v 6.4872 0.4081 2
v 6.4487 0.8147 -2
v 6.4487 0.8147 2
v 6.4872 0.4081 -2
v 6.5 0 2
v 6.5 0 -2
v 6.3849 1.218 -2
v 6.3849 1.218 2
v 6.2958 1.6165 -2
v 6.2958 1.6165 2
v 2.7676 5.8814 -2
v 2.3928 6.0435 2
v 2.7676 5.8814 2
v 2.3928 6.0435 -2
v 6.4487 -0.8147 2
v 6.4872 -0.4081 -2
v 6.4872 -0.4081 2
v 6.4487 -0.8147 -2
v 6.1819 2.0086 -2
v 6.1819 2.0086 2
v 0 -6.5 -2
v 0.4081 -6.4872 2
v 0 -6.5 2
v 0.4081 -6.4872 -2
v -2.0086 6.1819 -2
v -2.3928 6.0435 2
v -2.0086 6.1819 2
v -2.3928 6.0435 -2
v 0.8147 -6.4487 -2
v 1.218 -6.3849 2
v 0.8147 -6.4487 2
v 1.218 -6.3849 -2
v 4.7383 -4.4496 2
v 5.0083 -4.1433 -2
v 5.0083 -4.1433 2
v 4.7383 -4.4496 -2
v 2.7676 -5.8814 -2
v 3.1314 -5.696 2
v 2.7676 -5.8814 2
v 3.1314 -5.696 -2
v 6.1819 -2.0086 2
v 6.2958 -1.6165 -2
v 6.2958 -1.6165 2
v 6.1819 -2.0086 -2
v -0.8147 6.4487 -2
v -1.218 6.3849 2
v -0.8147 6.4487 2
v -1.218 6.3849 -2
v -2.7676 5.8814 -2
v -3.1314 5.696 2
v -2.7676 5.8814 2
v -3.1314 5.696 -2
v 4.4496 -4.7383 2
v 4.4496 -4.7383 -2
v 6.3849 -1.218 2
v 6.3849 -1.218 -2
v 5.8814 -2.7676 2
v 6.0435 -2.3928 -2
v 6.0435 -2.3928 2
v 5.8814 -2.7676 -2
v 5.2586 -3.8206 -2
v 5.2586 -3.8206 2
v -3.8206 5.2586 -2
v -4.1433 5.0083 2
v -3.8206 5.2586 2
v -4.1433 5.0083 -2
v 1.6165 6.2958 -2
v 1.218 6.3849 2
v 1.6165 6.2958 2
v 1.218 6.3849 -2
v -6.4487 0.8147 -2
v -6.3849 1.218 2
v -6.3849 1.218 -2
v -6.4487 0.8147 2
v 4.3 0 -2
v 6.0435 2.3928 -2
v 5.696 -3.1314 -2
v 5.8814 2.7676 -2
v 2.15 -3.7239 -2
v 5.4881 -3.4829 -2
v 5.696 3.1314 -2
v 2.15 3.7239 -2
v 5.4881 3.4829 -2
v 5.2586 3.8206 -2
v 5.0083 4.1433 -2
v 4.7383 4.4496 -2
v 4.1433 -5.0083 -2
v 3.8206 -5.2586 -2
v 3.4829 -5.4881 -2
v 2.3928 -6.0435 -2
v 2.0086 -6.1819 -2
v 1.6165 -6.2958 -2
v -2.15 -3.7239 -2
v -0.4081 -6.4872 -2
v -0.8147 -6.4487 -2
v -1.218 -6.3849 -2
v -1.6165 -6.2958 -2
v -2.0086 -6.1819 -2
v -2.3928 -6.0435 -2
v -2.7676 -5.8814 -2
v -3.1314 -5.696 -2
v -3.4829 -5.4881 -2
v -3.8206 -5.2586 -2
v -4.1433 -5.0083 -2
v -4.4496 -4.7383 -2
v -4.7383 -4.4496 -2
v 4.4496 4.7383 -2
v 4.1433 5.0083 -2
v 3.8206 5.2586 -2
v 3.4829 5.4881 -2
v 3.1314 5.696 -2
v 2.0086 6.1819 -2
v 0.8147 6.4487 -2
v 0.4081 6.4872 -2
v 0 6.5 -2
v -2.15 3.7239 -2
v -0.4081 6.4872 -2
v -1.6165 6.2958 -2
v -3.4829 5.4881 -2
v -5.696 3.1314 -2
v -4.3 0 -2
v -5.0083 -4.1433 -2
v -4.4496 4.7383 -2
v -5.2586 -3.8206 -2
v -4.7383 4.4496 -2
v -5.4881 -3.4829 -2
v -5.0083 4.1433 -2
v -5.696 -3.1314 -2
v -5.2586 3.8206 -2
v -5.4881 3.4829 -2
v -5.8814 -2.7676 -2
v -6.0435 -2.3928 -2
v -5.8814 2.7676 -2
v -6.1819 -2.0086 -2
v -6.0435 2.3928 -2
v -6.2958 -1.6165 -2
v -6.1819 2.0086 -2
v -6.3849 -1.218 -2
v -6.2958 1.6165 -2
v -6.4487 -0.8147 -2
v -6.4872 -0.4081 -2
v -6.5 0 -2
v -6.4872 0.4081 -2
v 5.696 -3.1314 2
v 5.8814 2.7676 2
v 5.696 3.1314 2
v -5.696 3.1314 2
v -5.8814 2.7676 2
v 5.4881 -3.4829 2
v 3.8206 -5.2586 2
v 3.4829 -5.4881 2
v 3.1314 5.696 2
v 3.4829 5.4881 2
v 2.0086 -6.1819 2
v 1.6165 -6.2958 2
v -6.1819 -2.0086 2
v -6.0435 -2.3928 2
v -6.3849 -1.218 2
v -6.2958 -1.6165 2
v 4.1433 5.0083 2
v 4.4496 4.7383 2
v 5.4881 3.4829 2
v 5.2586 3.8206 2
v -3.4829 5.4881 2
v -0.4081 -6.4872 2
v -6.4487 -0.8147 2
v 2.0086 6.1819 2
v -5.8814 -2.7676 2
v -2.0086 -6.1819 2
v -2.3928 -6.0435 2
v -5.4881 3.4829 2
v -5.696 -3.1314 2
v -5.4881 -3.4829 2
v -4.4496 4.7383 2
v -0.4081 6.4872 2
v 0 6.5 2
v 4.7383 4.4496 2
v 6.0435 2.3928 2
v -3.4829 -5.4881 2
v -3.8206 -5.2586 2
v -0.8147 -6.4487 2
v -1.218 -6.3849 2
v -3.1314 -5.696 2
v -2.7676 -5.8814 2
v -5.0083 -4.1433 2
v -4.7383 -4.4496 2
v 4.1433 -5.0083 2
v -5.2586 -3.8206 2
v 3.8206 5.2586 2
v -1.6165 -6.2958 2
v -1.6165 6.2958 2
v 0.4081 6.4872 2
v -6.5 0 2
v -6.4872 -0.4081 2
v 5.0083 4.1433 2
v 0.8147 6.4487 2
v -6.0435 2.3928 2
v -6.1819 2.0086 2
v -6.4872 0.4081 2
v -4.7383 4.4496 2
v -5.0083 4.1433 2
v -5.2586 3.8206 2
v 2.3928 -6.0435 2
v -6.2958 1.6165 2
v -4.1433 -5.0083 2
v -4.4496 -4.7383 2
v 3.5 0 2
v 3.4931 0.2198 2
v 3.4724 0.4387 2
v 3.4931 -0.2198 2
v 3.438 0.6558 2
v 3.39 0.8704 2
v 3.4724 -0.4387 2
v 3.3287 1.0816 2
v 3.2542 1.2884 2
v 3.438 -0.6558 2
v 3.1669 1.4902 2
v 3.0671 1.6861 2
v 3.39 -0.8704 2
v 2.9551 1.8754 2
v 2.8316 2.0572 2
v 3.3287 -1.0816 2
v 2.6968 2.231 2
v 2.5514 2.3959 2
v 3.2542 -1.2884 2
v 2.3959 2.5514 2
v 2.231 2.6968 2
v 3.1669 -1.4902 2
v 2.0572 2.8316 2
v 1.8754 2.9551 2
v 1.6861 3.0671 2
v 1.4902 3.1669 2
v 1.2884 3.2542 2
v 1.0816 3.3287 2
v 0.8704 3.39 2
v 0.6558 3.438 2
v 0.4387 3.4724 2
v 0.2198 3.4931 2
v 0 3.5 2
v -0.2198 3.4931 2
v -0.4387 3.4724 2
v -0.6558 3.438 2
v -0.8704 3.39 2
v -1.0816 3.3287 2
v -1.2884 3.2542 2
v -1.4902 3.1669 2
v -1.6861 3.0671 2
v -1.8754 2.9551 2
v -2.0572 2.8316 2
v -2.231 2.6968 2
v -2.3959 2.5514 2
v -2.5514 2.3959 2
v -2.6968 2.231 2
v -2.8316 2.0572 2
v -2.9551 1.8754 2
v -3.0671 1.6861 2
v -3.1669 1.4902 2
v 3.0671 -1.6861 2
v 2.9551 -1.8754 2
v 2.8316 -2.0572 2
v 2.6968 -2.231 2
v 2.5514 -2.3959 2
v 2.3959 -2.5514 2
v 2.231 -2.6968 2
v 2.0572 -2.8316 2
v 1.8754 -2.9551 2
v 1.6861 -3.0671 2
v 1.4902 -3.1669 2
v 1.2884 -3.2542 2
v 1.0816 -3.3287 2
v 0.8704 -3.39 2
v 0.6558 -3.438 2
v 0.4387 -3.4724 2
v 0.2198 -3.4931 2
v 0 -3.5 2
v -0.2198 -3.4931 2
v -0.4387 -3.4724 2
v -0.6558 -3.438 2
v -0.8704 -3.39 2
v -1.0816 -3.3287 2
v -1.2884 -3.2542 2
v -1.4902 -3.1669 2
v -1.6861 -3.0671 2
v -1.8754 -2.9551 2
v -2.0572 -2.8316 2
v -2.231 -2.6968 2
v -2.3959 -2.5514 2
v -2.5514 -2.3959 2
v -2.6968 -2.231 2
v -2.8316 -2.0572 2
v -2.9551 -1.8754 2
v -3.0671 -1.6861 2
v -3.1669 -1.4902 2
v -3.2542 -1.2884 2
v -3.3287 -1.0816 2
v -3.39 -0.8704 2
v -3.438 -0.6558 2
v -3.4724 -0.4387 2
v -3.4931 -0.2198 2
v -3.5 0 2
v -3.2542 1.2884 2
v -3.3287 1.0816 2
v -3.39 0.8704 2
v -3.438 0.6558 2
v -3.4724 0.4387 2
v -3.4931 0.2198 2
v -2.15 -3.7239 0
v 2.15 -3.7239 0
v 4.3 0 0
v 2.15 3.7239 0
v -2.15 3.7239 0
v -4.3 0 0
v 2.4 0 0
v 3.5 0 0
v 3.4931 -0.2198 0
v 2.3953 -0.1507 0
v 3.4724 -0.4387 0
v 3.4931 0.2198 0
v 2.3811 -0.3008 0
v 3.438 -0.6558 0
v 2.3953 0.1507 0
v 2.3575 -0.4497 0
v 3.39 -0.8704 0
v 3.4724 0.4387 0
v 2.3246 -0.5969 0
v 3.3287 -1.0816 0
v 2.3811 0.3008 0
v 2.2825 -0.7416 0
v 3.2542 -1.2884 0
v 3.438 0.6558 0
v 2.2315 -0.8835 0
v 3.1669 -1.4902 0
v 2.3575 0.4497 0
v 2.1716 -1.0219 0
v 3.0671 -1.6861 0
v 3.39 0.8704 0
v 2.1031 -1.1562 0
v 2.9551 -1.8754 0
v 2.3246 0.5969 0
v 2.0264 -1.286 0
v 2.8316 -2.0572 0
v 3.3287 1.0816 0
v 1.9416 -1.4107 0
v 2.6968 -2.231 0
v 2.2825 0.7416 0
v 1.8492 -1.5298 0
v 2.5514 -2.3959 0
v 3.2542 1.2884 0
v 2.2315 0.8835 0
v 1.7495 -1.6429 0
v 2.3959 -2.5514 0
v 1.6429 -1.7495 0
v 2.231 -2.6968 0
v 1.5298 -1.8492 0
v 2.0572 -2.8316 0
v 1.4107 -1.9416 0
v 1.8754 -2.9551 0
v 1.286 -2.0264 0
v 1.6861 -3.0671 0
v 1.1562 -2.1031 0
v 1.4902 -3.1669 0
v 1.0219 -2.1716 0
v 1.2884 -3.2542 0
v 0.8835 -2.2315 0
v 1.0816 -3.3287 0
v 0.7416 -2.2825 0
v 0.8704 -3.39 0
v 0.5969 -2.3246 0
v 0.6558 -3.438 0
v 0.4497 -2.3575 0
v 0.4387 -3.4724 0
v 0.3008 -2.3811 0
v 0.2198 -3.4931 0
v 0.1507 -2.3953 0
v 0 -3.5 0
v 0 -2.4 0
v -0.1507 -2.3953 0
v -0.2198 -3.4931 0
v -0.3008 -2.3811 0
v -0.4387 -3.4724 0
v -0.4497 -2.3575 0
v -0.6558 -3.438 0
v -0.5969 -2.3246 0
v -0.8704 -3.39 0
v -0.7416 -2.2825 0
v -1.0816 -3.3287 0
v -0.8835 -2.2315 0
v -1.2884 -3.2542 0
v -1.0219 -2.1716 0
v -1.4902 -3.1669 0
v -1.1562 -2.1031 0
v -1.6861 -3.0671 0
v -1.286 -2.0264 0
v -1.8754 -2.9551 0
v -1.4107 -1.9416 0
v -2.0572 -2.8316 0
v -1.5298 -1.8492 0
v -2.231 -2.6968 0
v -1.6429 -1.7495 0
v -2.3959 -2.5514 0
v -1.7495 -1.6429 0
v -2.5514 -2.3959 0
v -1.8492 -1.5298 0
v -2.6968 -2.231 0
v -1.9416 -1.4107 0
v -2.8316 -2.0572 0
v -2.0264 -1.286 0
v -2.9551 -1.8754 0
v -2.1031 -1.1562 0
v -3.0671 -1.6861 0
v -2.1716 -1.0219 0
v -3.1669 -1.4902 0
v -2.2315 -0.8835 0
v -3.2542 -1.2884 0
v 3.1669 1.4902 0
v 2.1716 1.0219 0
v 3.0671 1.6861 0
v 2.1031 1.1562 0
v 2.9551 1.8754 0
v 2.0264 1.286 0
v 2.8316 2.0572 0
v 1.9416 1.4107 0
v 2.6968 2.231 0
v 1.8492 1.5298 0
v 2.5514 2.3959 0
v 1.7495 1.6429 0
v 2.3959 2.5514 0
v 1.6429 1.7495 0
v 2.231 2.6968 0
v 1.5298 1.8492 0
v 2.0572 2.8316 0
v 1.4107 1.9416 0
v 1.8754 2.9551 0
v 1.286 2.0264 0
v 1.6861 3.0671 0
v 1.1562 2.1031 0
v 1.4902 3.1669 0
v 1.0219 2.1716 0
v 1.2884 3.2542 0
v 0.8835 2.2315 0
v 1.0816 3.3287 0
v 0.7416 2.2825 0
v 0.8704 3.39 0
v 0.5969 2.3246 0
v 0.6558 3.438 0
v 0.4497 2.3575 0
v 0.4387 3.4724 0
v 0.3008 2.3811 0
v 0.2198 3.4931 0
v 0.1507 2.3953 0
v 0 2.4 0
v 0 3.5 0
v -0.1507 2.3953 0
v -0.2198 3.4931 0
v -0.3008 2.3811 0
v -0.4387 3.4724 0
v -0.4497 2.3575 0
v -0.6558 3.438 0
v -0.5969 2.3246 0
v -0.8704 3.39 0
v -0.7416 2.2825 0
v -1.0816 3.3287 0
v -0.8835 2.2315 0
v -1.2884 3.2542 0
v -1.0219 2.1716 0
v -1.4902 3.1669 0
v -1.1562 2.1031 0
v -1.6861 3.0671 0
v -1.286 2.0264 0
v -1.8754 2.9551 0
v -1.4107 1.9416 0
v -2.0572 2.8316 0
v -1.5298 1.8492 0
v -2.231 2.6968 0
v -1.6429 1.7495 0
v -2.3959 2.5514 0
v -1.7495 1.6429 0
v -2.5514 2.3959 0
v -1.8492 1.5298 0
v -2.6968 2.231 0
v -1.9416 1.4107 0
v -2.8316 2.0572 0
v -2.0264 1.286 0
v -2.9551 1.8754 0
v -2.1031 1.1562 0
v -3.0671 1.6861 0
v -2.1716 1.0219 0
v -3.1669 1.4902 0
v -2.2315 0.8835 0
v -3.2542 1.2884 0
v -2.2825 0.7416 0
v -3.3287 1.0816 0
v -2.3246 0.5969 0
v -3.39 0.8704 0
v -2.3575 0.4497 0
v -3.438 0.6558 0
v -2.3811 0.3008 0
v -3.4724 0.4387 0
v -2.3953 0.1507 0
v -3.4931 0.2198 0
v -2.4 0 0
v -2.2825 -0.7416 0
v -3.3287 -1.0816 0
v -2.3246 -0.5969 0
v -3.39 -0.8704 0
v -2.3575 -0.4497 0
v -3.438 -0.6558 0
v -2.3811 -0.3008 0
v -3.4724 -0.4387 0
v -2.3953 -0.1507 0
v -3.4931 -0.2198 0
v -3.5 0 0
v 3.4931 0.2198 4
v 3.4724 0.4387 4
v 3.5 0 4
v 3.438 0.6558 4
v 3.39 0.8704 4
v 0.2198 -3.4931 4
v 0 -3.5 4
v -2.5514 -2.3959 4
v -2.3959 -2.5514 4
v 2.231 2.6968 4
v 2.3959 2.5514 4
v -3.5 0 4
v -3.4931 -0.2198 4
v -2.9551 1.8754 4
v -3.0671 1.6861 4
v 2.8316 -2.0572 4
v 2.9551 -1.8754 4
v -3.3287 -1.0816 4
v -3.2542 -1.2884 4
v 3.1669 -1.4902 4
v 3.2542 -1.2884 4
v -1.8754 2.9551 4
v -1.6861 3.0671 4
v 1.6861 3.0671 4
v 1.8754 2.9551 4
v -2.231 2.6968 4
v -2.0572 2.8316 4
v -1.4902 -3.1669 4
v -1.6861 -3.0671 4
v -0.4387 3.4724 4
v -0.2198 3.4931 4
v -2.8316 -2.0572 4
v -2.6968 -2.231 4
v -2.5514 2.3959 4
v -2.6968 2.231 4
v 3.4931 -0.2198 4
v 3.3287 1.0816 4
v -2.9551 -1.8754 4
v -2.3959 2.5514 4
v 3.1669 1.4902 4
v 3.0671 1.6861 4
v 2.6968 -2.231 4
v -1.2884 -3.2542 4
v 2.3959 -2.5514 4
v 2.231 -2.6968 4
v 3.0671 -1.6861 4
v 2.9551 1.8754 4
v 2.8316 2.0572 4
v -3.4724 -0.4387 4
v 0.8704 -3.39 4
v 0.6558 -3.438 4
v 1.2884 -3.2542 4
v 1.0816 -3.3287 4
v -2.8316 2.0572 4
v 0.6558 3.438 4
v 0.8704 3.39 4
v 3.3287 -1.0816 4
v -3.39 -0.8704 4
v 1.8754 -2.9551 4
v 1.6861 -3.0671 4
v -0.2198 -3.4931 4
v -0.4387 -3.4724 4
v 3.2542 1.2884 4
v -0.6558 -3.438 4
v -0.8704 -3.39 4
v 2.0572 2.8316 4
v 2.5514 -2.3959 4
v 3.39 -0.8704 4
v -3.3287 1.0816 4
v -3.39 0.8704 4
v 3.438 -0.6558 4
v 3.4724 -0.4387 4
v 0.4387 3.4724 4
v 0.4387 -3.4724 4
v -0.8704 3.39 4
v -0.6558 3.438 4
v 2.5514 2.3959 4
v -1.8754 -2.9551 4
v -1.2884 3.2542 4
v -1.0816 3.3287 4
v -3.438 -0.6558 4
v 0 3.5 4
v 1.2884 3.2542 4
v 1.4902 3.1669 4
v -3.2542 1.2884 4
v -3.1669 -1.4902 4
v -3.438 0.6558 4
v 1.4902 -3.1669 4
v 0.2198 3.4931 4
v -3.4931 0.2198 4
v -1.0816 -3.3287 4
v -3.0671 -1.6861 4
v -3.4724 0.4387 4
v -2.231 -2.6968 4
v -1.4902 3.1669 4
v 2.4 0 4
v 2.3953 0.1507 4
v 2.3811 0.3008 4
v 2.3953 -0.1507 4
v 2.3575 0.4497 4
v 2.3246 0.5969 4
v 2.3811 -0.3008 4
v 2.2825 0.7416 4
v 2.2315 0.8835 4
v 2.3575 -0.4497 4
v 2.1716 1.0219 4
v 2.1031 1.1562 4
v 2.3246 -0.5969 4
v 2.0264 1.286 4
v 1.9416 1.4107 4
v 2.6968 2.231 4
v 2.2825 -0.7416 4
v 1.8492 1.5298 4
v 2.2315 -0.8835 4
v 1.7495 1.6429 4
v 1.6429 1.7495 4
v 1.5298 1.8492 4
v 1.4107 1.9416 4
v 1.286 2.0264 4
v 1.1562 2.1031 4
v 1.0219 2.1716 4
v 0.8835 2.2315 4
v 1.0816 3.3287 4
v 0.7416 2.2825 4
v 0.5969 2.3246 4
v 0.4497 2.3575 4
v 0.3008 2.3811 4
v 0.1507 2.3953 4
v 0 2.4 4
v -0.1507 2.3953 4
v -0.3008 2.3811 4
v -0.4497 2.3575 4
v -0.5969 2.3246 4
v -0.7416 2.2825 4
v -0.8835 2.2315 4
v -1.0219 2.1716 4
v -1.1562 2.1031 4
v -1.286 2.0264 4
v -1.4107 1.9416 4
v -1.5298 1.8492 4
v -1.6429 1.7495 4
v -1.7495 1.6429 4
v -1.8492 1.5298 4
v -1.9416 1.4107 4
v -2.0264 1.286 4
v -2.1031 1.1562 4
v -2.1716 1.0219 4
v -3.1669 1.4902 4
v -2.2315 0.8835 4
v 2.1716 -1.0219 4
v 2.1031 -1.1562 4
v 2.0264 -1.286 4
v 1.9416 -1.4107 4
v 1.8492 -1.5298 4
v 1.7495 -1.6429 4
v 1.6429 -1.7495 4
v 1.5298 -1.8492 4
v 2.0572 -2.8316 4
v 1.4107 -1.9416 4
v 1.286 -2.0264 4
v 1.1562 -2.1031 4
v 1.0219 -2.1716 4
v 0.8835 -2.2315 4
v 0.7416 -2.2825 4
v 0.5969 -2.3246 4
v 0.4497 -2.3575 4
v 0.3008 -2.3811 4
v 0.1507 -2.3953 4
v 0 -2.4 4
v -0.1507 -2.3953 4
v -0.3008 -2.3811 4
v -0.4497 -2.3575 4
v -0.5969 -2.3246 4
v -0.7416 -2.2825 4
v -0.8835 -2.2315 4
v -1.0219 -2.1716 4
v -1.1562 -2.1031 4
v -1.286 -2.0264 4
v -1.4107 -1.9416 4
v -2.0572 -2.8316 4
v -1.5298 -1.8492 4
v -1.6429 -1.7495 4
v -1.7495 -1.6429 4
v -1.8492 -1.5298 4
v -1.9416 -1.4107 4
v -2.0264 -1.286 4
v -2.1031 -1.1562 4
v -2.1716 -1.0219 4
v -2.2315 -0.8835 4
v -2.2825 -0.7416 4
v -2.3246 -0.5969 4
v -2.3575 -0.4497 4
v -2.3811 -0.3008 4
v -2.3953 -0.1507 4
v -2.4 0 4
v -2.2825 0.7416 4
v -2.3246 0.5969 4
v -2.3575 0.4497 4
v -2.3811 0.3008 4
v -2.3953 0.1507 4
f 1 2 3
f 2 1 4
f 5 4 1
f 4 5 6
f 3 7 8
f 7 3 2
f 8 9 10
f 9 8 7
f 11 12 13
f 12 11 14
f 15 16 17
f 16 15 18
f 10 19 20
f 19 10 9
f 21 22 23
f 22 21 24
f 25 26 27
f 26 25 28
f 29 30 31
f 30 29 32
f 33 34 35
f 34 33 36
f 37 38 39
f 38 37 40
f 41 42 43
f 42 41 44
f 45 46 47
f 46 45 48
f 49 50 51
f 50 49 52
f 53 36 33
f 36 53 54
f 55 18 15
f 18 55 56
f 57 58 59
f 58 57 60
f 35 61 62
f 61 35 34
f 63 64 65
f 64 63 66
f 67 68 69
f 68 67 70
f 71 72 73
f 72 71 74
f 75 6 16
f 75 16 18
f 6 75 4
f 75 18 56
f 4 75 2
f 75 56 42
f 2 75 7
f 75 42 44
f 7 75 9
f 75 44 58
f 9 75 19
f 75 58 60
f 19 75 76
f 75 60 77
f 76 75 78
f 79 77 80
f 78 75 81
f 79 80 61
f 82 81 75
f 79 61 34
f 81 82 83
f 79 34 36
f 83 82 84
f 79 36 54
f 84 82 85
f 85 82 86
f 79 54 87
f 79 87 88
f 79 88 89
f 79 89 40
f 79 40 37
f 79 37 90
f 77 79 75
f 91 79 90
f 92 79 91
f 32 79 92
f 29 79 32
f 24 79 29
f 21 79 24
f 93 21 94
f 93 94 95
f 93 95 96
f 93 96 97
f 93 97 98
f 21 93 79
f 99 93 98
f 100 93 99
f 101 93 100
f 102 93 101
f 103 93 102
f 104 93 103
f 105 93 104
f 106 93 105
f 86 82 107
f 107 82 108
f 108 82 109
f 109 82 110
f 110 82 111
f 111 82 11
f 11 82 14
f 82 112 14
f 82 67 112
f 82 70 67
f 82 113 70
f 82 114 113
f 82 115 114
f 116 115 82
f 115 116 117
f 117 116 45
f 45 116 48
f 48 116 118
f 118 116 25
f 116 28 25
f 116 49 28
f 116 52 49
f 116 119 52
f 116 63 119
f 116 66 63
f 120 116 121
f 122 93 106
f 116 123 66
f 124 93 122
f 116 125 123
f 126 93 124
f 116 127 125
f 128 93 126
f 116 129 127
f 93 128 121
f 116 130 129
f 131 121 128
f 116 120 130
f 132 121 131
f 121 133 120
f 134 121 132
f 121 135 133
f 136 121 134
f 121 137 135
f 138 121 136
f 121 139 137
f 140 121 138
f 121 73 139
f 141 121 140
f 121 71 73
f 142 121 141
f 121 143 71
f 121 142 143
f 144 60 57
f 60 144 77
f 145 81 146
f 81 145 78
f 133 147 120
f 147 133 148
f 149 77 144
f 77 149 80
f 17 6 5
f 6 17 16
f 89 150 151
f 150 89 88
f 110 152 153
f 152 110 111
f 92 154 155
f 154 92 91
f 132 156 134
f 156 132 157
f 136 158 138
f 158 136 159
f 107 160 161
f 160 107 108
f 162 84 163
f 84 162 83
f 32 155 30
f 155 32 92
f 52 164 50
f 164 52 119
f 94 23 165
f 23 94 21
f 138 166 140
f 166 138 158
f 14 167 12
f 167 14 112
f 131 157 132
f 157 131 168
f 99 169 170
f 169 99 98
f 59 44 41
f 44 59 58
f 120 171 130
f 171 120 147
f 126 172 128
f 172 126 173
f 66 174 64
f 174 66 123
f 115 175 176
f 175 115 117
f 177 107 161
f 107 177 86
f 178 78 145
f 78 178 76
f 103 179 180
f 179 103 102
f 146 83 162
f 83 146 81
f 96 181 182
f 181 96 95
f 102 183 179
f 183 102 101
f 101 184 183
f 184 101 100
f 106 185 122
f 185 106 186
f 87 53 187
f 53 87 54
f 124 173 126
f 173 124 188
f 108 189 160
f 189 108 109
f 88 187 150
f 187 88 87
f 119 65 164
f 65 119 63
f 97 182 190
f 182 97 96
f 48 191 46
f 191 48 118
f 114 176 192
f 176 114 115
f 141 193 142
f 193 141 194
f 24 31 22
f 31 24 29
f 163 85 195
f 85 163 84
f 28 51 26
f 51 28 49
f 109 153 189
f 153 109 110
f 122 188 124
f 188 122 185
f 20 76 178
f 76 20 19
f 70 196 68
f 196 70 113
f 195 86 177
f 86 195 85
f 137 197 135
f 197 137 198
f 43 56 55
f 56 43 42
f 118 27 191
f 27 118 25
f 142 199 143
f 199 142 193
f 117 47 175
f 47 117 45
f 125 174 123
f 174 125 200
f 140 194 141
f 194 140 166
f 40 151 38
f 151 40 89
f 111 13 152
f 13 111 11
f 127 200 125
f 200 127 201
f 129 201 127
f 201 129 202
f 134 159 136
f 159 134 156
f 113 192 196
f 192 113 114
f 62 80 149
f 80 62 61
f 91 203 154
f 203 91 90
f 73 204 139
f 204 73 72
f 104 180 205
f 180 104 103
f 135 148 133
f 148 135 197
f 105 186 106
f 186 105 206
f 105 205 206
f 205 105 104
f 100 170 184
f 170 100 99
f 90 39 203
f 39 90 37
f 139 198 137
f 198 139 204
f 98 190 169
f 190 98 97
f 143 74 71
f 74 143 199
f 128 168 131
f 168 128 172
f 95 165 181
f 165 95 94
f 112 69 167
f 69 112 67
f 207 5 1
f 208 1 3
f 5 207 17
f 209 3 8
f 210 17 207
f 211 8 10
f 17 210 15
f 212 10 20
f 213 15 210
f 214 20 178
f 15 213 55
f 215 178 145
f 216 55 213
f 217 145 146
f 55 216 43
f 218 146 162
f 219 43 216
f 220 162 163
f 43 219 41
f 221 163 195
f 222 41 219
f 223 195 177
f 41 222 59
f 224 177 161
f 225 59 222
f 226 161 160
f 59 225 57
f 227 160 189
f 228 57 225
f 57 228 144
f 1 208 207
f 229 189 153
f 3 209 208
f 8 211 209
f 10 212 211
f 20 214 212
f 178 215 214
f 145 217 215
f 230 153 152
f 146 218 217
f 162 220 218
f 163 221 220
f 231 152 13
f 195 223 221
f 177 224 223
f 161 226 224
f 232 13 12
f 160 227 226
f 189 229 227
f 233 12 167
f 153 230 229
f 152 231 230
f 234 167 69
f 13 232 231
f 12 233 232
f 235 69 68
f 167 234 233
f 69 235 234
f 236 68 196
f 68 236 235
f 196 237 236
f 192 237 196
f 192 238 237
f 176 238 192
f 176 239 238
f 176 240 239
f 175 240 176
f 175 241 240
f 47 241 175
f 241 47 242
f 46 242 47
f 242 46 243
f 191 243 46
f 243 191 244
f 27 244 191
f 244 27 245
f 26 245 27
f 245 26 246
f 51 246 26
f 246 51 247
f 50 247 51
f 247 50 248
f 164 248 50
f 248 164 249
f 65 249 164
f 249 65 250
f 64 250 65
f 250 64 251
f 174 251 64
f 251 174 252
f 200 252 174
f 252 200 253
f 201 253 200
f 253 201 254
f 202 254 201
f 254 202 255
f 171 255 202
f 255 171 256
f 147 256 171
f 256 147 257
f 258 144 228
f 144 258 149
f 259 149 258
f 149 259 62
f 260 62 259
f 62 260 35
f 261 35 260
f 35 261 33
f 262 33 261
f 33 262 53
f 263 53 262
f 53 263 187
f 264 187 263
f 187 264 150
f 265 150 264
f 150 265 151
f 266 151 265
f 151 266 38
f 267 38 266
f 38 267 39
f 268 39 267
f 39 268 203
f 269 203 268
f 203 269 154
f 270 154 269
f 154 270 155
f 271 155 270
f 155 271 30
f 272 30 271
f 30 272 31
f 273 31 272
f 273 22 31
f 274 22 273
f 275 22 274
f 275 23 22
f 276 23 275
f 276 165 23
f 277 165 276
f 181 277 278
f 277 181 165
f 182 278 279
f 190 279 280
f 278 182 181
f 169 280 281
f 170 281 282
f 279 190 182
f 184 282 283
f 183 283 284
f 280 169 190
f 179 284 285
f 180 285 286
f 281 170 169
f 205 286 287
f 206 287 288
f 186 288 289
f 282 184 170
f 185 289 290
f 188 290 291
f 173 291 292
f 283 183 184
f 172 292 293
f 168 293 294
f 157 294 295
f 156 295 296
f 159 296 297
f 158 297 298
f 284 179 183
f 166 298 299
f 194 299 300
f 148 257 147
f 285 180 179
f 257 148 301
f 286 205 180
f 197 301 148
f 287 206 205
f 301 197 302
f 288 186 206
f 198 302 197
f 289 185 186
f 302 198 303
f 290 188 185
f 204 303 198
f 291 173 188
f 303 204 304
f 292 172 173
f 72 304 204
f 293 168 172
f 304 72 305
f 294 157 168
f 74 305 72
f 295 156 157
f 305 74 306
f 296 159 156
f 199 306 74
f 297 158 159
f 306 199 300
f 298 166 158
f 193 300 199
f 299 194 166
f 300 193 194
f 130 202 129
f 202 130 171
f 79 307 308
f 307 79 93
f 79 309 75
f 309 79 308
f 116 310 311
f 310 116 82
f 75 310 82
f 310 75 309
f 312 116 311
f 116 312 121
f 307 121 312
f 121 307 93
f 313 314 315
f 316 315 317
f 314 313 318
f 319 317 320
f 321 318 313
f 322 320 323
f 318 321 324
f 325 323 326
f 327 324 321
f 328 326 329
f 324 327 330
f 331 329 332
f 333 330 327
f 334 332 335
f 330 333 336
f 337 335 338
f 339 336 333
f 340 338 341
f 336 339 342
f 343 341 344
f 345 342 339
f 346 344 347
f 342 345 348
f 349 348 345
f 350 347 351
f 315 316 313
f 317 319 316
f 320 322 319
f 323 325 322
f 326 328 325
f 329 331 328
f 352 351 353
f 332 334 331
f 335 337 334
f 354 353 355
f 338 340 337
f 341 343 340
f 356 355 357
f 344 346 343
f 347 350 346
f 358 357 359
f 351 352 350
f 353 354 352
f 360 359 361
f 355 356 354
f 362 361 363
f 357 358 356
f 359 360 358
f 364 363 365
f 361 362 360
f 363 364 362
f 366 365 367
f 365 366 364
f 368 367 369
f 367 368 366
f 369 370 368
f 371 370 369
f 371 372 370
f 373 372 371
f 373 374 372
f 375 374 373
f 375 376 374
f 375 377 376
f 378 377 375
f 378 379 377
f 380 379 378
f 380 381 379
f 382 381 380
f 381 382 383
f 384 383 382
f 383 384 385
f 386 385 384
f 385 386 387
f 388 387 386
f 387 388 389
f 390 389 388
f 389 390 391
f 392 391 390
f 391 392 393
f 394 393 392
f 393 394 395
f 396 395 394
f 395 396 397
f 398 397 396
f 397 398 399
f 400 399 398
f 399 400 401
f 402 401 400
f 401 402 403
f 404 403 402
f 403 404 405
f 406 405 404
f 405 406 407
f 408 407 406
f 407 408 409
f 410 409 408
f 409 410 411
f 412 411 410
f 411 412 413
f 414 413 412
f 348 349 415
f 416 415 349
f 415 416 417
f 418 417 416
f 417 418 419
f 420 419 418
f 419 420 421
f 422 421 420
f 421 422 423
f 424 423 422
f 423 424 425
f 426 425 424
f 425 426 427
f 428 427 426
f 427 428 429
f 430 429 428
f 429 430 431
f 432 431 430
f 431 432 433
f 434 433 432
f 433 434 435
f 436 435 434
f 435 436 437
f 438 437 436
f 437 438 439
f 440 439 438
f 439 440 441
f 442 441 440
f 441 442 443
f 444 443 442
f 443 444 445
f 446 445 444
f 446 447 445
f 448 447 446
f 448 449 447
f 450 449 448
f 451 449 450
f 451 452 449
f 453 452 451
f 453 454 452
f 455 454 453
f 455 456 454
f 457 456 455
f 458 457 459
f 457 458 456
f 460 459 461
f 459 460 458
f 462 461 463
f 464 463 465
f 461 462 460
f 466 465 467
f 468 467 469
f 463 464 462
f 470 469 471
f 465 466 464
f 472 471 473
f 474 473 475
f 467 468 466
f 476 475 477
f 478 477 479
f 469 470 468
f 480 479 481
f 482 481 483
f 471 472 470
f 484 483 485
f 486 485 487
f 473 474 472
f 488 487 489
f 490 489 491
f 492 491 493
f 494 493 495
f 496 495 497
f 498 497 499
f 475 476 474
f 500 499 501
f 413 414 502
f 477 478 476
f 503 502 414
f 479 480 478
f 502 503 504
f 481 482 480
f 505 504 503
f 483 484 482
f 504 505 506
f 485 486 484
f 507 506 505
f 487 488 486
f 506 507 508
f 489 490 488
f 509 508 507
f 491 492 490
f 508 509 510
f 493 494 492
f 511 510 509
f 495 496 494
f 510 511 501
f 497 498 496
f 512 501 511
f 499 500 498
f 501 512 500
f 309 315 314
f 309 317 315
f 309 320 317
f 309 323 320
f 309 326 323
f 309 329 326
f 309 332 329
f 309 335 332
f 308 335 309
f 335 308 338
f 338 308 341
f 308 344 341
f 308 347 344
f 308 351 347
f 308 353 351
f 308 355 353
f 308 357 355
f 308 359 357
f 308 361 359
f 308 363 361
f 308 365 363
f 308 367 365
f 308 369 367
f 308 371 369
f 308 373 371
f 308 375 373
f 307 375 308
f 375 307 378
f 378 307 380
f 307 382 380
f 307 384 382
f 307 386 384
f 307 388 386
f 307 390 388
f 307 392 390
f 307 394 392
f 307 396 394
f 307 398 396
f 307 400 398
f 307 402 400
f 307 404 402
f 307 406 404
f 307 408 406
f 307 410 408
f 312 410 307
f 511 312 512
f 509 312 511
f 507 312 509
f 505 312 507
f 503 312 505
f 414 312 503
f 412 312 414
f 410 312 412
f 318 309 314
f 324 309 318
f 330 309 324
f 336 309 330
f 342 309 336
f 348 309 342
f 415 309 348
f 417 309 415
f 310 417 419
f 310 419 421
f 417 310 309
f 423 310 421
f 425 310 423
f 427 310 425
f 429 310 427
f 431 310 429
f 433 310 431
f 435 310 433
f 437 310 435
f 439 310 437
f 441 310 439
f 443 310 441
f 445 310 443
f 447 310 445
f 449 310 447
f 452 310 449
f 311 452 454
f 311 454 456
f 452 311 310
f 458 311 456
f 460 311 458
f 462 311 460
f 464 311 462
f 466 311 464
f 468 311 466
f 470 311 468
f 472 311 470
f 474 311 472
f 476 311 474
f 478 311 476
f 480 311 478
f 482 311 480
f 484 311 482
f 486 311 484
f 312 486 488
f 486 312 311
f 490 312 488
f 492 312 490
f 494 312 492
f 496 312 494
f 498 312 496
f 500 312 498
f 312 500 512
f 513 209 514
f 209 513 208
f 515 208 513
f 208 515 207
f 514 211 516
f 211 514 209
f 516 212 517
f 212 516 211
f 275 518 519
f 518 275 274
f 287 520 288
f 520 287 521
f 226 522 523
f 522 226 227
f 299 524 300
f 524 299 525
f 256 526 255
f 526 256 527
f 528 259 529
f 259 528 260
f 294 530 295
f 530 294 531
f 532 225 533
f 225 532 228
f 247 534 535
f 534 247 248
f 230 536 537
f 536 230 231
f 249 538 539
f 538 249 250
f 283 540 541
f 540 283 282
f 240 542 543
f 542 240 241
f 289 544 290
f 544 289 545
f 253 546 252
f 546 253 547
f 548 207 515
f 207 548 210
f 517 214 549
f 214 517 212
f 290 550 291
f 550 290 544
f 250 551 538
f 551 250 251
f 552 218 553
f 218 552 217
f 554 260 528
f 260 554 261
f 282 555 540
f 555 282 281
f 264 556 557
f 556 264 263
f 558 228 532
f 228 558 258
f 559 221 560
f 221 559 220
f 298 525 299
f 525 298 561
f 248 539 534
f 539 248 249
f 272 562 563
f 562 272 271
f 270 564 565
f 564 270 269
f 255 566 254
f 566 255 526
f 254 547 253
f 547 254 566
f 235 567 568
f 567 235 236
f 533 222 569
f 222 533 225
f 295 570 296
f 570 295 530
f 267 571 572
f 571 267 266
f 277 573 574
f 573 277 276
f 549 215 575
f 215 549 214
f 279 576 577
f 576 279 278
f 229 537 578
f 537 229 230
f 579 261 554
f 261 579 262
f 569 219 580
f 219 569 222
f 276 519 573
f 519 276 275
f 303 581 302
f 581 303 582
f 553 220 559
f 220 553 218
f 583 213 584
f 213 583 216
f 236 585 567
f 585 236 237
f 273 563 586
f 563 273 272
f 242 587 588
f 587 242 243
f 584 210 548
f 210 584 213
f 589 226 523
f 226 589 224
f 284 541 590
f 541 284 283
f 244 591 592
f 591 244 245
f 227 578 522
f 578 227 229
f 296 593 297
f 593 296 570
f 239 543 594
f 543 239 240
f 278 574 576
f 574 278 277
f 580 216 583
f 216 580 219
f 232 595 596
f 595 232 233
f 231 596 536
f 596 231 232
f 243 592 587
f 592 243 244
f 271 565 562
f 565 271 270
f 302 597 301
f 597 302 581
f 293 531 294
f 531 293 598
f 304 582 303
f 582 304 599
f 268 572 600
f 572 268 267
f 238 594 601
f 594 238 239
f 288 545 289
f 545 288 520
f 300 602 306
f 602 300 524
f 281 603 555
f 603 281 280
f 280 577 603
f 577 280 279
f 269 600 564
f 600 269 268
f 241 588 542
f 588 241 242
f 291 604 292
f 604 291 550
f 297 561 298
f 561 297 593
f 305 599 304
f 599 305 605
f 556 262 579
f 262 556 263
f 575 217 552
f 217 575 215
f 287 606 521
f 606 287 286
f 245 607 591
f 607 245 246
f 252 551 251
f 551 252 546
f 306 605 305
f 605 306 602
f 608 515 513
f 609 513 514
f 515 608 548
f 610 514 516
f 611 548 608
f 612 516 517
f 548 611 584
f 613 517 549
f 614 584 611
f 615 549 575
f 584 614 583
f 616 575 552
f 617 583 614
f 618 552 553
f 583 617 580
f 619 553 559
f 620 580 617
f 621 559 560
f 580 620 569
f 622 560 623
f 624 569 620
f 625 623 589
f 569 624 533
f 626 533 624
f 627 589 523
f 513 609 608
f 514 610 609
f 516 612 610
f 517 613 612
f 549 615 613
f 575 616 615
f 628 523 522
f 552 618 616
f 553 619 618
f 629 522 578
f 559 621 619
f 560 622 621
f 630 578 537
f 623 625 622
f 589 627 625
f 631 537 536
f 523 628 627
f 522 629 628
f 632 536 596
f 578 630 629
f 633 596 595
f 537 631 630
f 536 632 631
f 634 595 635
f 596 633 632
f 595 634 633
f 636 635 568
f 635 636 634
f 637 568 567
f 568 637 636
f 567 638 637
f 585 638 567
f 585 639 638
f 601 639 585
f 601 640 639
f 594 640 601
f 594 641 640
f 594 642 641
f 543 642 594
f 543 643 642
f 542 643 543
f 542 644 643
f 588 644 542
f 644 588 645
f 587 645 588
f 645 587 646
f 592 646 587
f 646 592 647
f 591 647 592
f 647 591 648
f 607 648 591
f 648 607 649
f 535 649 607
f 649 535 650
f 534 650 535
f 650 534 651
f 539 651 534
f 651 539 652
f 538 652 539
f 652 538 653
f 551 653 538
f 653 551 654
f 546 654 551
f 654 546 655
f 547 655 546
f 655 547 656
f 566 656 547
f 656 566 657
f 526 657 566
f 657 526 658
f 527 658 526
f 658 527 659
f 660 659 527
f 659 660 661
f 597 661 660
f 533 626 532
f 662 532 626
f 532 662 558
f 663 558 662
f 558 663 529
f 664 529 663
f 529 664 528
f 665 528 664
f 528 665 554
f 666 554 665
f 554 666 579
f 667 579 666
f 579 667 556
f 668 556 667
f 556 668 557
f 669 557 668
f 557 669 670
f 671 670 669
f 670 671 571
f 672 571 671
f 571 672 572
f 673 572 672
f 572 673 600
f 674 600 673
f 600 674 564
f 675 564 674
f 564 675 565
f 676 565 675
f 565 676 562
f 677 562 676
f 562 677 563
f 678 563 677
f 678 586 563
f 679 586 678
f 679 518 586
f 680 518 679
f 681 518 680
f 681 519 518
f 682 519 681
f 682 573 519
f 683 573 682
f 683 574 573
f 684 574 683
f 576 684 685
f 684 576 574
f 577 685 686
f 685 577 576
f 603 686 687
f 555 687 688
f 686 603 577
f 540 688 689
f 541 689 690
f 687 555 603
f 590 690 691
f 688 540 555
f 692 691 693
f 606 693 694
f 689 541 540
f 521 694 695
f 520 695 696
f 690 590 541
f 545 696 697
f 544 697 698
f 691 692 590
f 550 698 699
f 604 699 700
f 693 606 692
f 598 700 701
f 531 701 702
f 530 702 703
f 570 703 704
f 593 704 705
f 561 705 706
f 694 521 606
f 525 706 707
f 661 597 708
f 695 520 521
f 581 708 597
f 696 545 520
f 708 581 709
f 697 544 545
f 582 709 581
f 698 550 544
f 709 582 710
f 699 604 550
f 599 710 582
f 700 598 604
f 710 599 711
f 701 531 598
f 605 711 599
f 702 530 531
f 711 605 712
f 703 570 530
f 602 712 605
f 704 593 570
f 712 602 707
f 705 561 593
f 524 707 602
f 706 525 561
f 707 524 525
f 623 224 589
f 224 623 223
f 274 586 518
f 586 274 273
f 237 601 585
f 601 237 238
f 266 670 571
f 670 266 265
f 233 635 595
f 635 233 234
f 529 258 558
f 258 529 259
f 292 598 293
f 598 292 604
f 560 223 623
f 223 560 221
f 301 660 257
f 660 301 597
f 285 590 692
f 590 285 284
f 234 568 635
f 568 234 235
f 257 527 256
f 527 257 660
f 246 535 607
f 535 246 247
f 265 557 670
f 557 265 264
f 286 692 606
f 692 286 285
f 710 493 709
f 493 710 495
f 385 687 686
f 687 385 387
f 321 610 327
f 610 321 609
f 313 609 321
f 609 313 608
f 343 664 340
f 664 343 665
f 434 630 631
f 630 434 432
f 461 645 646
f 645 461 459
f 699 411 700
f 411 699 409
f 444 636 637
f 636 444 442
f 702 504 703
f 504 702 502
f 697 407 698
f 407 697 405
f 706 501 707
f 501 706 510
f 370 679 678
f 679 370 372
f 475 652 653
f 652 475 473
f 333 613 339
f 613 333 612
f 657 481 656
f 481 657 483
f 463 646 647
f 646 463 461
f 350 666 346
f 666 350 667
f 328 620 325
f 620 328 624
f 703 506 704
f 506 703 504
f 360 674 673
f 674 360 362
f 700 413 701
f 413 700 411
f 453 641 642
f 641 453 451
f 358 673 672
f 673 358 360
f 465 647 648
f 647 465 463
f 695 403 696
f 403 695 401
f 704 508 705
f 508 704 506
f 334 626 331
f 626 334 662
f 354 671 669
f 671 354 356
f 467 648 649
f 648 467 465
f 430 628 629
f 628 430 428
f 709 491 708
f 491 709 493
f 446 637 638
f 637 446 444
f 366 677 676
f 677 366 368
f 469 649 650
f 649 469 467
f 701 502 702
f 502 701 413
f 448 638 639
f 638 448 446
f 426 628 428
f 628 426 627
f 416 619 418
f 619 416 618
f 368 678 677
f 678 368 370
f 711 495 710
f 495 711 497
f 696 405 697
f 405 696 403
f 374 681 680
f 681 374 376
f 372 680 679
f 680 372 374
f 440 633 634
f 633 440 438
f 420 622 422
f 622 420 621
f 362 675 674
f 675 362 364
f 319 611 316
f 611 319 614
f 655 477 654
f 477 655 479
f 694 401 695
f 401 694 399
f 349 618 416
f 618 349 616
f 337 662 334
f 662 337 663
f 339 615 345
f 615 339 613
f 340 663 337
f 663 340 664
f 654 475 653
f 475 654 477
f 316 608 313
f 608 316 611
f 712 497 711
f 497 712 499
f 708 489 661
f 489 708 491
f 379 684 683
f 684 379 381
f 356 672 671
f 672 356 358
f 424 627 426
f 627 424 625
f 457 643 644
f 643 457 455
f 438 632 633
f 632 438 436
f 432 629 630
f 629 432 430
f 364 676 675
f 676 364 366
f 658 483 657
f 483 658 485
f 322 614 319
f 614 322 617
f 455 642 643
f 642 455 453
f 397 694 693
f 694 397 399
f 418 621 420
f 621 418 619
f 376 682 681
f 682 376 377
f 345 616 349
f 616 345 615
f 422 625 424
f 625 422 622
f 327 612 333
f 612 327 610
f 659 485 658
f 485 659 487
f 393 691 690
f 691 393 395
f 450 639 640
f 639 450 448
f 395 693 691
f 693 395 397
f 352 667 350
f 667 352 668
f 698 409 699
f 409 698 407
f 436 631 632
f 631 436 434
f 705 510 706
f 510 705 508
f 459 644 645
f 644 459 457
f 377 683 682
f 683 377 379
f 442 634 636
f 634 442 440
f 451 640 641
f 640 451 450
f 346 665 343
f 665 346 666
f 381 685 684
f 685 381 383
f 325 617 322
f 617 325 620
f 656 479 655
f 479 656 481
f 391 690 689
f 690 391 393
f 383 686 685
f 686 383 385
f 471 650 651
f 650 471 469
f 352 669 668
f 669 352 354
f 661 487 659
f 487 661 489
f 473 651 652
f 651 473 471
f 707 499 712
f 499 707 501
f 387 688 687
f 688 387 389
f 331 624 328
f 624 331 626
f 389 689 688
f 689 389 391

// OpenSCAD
module nut(){
  $fn=6;
 cylinder(4,4.3,4.3,true);
  }

  $fn=100;  
difference(){
union(){
difference()
{
  cylinder(4,6.5,6.5,true);
  
 // translate([0,0,-3]) cylinder(5,7,7,true);
 translate([0,0,-2])  nut();
}

translate([0,0,2]) cylinder(4,3.5,3.5,true);
}

translate([0,0,16])  cylinder(55,2.4,2.4,true);

}
